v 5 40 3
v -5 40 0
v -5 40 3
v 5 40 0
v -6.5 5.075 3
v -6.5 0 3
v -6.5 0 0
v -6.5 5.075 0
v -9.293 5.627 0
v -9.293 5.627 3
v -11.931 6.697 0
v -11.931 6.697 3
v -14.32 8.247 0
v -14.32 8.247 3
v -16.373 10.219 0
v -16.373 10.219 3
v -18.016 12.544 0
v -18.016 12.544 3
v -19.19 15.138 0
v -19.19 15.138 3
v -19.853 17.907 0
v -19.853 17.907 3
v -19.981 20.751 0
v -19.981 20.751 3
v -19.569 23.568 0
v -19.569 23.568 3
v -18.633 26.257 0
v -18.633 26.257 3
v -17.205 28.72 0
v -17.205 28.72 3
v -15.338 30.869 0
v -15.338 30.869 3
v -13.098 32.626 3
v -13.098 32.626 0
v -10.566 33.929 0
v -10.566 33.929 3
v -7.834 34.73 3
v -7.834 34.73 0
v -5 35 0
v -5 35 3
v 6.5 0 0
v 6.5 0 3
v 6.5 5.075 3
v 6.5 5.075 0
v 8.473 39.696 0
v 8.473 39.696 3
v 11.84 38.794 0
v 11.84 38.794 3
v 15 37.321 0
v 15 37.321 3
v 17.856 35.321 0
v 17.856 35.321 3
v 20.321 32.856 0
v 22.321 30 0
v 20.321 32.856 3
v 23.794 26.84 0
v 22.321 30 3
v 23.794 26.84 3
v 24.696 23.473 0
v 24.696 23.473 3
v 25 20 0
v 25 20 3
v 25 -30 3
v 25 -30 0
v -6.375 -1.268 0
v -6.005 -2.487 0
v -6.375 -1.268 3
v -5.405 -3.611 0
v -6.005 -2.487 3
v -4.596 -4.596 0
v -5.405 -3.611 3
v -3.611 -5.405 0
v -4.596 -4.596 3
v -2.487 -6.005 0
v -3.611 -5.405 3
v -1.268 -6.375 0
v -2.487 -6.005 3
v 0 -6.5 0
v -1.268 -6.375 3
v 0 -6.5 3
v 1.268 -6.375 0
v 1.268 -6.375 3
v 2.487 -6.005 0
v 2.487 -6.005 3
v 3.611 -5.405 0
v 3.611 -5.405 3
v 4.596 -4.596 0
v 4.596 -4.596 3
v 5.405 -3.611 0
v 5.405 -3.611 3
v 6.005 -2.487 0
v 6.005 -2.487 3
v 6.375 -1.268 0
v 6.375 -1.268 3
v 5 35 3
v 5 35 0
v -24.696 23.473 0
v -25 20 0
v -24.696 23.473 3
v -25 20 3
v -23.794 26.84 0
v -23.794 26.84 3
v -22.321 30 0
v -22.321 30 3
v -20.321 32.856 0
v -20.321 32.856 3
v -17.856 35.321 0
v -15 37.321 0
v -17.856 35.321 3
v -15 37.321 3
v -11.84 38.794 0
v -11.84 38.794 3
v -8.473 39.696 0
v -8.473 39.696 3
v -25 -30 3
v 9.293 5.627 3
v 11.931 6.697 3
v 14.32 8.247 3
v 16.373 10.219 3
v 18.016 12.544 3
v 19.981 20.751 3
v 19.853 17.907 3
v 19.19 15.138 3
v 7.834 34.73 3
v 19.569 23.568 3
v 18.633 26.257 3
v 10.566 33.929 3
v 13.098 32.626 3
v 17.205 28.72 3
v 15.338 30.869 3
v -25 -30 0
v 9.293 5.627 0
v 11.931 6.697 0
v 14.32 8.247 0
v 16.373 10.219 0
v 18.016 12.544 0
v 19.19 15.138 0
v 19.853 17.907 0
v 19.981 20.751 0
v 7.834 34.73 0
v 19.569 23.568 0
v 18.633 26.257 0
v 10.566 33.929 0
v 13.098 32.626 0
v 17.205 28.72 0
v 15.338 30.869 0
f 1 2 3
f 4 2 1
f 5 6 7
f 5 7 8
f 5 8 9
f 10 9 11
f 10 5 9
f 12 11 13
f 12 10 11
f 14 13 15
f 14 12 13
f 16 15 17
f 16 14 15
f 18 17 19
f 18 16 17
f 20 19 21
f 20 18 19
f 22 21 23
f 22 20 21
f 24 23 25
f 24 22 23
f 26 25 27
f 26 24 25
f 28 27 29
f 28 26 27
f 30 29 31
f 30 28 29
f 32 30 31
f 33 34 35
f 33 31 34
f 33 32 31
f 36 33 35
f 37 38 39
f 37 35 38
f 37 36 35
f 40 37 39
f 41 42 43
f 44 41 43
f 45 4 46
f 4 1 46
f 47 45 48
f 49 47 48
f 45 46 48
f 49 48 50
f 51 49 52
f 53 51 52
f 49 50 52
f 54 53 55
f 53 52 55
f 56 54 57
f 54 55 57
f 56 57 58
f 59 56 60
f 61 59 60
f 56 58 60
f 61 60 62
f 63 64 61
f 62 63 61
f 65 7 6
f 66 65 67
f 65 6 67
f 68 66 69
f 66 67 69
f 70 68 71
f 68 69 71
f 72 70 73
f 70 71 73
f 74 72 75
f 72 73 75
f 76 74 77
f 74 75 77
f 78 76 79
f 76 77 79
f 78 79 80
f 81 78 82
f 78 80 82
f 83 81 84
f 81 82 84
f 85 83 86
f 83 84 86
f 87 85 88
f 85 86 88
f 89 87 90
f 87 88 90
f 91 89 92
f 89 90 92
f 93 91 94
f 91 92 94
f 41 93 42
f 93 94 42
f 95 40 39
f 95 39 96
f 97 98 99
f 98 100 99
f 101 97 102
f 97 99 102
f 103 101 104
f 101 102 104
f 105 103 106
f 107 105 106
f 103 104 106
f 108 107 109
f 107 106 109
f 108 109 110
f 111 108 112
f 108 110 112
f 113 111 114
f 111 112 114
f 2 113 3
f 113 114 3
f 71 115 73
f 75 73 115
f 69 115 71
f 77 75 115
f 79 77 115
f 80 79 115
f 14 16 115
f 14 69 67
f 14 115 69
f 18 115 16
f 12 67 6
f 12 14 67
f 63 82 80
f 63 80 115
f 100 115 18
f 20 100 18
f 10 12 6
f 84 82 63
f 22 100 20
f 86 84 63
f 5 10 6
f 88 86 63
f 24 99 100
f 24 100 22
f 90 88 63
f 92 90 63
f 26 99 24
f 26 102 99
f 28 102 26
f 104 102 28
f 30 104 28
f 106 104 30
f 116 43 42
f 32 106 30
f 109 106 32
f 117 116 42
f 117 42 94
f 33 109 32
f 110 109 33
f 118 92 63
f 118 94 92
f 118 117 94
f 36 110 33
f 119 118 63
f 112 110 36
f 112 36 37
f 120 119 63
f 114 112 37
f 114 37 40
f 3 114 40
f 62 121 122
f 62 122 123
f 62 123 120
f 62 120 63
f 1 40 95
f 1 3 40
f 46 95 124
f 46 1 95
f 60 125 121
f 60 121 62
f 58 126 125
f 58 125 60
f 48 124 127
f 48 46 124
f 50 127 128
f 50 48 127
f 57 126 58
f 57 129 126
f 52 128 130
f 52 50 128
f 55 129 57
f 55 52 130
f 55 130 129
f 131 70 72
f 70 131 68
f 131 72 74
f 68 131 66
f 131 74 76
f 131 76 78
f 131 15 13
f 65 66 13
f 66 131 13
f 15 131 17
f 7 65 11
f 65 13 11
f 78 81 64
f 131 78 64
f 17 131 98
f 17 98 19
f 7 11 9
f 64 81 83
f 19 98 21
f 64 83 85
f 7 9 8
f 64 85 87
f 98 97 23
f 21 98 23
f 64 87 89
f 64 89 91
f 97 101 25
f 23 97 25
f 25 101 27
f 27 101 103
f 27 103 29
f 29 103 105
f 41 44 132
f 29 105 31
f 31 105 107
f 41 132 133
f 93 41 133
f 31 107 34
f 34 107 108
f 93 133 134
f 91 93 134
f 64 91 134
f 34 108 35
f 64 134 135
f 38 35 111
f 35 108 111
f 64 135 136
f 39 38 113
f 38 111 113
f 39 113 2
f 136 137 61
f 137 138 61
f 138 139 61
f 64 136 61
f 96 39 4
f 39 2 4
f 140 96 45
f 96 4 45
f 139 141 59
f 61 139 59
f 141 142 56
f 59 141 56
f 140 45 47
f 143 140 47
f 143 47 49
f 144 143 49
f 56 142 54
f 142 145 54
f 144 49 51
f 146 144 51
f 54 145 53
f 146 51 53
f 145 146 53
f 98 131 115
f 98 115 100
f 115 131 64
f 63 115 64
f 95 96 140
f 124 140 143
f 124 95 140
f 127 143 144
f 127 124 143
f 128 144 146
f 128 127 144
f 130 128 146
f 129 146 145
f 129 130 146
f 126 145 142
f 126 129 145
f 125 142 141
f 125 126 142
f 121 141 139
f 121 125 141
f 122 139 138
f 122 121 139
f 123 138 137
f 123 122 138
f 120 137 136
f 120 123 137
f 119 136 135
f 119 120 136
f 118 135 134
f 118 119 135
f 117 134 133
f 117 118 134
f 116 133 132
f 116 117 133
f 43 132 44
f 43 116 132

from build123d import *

# Parameters (mm, degrees)
SKETCH1_W               = 50
SKETCH1_H               = 70
BOSS_EXTRUDE1_DEPTH     = 3
SKETCH2_R               = 6.5
CUT_EXTRUDE1_DEPTH      = 1
CUT_EXTRUDE1_DEPTH_BACK = 4
CUT_EXTRUDE2_DEPTH      = 1
CUT_EXTRUDE2_DEPTH_BACK = 4
SKETCH4_W               = 13
SKETCH4_H               = 15
CUT_EXTRUDE3_DEPTH      = 1
CUT_EXTRUDE3_DEPTH_BACK = 4
FILLET1_R               = 20


with BuildPart() as part:
    # Sketch1 → Boss-Extrude1 (new body)
    with BuildSketch(Plane.XY):
        with Locations((0, 5)):
            Rectangle(SKETCH1_W, SKETCH1_H)
    extrude(amount=BOSS_EXTRUDE1_DEPTH)

    # Sketch2 → Cut-Extrude1 (cut, two sides)
    with BuildSketch(Plane.XY.offset(3)) as cut_extrude1_sk:
        Circle(SKETCH2_R)
    extrude(amount=CUT_EXTRUDE1_DEPTH, mode=Mode.SUBTRACT)
    extrude(cut_extrude1_sk.sketch, amount=-CUT_EXTRUDE1_DEPTH_BACK, mode=Mode.SUBTRACT)

    # Sketch3 → Cut-Extrude2 (cut, two sides)
    with BuildSketch(Plane.XY.offset(3)) as cut_extrude2_sk:
        with BuildLine():
            Line((-5, 35), (5, 35))
            ThreePointArc((5, 35), (20, 20), (5, 5))
            Line((5, 5), (-5, 5))
            ThreePointArc((-5, 5), (-20, 20), (-5, 35))
        make_face()
    extrude(amount=CUT_EXTRUDE2_DEPTH, mode=Mode.SUBTRACT)
    extrude(cut_extrude2_sk.sketch, amount=-CUT_EXTRUDE2_DEPTH_BACK, mode=Mode.SUBTRACT)

    # Sketch4 → Cut-Extrude3 (cut, two sides)
    with BuildSketch(Plane.XY.offset(3)) as cut_extrude3_sk:
        with Locations((0, 7.5)):
            Rectangle(SKETCH4_W, SKETCH4_H)
    extrude(amount=CUT_EXTRUDE3_DEPTH, mode=Mode.SUBTRACT)
    extrude(cut_extrude3_sk.sketch, amount=-CUT_EXTRUDE3_DEPTH_BACK, mode=Mode.SUBTRACT)

    # Fillet1
    fillet1_edges = [part.edges().sort_by_distance(p)[0] for p in [
        (-25, 40, 1.5),
        (25, 40, 1.5),
    ]]
    fillet(fillet1_edges, radius=FILLET1_R)


solid = part.part
